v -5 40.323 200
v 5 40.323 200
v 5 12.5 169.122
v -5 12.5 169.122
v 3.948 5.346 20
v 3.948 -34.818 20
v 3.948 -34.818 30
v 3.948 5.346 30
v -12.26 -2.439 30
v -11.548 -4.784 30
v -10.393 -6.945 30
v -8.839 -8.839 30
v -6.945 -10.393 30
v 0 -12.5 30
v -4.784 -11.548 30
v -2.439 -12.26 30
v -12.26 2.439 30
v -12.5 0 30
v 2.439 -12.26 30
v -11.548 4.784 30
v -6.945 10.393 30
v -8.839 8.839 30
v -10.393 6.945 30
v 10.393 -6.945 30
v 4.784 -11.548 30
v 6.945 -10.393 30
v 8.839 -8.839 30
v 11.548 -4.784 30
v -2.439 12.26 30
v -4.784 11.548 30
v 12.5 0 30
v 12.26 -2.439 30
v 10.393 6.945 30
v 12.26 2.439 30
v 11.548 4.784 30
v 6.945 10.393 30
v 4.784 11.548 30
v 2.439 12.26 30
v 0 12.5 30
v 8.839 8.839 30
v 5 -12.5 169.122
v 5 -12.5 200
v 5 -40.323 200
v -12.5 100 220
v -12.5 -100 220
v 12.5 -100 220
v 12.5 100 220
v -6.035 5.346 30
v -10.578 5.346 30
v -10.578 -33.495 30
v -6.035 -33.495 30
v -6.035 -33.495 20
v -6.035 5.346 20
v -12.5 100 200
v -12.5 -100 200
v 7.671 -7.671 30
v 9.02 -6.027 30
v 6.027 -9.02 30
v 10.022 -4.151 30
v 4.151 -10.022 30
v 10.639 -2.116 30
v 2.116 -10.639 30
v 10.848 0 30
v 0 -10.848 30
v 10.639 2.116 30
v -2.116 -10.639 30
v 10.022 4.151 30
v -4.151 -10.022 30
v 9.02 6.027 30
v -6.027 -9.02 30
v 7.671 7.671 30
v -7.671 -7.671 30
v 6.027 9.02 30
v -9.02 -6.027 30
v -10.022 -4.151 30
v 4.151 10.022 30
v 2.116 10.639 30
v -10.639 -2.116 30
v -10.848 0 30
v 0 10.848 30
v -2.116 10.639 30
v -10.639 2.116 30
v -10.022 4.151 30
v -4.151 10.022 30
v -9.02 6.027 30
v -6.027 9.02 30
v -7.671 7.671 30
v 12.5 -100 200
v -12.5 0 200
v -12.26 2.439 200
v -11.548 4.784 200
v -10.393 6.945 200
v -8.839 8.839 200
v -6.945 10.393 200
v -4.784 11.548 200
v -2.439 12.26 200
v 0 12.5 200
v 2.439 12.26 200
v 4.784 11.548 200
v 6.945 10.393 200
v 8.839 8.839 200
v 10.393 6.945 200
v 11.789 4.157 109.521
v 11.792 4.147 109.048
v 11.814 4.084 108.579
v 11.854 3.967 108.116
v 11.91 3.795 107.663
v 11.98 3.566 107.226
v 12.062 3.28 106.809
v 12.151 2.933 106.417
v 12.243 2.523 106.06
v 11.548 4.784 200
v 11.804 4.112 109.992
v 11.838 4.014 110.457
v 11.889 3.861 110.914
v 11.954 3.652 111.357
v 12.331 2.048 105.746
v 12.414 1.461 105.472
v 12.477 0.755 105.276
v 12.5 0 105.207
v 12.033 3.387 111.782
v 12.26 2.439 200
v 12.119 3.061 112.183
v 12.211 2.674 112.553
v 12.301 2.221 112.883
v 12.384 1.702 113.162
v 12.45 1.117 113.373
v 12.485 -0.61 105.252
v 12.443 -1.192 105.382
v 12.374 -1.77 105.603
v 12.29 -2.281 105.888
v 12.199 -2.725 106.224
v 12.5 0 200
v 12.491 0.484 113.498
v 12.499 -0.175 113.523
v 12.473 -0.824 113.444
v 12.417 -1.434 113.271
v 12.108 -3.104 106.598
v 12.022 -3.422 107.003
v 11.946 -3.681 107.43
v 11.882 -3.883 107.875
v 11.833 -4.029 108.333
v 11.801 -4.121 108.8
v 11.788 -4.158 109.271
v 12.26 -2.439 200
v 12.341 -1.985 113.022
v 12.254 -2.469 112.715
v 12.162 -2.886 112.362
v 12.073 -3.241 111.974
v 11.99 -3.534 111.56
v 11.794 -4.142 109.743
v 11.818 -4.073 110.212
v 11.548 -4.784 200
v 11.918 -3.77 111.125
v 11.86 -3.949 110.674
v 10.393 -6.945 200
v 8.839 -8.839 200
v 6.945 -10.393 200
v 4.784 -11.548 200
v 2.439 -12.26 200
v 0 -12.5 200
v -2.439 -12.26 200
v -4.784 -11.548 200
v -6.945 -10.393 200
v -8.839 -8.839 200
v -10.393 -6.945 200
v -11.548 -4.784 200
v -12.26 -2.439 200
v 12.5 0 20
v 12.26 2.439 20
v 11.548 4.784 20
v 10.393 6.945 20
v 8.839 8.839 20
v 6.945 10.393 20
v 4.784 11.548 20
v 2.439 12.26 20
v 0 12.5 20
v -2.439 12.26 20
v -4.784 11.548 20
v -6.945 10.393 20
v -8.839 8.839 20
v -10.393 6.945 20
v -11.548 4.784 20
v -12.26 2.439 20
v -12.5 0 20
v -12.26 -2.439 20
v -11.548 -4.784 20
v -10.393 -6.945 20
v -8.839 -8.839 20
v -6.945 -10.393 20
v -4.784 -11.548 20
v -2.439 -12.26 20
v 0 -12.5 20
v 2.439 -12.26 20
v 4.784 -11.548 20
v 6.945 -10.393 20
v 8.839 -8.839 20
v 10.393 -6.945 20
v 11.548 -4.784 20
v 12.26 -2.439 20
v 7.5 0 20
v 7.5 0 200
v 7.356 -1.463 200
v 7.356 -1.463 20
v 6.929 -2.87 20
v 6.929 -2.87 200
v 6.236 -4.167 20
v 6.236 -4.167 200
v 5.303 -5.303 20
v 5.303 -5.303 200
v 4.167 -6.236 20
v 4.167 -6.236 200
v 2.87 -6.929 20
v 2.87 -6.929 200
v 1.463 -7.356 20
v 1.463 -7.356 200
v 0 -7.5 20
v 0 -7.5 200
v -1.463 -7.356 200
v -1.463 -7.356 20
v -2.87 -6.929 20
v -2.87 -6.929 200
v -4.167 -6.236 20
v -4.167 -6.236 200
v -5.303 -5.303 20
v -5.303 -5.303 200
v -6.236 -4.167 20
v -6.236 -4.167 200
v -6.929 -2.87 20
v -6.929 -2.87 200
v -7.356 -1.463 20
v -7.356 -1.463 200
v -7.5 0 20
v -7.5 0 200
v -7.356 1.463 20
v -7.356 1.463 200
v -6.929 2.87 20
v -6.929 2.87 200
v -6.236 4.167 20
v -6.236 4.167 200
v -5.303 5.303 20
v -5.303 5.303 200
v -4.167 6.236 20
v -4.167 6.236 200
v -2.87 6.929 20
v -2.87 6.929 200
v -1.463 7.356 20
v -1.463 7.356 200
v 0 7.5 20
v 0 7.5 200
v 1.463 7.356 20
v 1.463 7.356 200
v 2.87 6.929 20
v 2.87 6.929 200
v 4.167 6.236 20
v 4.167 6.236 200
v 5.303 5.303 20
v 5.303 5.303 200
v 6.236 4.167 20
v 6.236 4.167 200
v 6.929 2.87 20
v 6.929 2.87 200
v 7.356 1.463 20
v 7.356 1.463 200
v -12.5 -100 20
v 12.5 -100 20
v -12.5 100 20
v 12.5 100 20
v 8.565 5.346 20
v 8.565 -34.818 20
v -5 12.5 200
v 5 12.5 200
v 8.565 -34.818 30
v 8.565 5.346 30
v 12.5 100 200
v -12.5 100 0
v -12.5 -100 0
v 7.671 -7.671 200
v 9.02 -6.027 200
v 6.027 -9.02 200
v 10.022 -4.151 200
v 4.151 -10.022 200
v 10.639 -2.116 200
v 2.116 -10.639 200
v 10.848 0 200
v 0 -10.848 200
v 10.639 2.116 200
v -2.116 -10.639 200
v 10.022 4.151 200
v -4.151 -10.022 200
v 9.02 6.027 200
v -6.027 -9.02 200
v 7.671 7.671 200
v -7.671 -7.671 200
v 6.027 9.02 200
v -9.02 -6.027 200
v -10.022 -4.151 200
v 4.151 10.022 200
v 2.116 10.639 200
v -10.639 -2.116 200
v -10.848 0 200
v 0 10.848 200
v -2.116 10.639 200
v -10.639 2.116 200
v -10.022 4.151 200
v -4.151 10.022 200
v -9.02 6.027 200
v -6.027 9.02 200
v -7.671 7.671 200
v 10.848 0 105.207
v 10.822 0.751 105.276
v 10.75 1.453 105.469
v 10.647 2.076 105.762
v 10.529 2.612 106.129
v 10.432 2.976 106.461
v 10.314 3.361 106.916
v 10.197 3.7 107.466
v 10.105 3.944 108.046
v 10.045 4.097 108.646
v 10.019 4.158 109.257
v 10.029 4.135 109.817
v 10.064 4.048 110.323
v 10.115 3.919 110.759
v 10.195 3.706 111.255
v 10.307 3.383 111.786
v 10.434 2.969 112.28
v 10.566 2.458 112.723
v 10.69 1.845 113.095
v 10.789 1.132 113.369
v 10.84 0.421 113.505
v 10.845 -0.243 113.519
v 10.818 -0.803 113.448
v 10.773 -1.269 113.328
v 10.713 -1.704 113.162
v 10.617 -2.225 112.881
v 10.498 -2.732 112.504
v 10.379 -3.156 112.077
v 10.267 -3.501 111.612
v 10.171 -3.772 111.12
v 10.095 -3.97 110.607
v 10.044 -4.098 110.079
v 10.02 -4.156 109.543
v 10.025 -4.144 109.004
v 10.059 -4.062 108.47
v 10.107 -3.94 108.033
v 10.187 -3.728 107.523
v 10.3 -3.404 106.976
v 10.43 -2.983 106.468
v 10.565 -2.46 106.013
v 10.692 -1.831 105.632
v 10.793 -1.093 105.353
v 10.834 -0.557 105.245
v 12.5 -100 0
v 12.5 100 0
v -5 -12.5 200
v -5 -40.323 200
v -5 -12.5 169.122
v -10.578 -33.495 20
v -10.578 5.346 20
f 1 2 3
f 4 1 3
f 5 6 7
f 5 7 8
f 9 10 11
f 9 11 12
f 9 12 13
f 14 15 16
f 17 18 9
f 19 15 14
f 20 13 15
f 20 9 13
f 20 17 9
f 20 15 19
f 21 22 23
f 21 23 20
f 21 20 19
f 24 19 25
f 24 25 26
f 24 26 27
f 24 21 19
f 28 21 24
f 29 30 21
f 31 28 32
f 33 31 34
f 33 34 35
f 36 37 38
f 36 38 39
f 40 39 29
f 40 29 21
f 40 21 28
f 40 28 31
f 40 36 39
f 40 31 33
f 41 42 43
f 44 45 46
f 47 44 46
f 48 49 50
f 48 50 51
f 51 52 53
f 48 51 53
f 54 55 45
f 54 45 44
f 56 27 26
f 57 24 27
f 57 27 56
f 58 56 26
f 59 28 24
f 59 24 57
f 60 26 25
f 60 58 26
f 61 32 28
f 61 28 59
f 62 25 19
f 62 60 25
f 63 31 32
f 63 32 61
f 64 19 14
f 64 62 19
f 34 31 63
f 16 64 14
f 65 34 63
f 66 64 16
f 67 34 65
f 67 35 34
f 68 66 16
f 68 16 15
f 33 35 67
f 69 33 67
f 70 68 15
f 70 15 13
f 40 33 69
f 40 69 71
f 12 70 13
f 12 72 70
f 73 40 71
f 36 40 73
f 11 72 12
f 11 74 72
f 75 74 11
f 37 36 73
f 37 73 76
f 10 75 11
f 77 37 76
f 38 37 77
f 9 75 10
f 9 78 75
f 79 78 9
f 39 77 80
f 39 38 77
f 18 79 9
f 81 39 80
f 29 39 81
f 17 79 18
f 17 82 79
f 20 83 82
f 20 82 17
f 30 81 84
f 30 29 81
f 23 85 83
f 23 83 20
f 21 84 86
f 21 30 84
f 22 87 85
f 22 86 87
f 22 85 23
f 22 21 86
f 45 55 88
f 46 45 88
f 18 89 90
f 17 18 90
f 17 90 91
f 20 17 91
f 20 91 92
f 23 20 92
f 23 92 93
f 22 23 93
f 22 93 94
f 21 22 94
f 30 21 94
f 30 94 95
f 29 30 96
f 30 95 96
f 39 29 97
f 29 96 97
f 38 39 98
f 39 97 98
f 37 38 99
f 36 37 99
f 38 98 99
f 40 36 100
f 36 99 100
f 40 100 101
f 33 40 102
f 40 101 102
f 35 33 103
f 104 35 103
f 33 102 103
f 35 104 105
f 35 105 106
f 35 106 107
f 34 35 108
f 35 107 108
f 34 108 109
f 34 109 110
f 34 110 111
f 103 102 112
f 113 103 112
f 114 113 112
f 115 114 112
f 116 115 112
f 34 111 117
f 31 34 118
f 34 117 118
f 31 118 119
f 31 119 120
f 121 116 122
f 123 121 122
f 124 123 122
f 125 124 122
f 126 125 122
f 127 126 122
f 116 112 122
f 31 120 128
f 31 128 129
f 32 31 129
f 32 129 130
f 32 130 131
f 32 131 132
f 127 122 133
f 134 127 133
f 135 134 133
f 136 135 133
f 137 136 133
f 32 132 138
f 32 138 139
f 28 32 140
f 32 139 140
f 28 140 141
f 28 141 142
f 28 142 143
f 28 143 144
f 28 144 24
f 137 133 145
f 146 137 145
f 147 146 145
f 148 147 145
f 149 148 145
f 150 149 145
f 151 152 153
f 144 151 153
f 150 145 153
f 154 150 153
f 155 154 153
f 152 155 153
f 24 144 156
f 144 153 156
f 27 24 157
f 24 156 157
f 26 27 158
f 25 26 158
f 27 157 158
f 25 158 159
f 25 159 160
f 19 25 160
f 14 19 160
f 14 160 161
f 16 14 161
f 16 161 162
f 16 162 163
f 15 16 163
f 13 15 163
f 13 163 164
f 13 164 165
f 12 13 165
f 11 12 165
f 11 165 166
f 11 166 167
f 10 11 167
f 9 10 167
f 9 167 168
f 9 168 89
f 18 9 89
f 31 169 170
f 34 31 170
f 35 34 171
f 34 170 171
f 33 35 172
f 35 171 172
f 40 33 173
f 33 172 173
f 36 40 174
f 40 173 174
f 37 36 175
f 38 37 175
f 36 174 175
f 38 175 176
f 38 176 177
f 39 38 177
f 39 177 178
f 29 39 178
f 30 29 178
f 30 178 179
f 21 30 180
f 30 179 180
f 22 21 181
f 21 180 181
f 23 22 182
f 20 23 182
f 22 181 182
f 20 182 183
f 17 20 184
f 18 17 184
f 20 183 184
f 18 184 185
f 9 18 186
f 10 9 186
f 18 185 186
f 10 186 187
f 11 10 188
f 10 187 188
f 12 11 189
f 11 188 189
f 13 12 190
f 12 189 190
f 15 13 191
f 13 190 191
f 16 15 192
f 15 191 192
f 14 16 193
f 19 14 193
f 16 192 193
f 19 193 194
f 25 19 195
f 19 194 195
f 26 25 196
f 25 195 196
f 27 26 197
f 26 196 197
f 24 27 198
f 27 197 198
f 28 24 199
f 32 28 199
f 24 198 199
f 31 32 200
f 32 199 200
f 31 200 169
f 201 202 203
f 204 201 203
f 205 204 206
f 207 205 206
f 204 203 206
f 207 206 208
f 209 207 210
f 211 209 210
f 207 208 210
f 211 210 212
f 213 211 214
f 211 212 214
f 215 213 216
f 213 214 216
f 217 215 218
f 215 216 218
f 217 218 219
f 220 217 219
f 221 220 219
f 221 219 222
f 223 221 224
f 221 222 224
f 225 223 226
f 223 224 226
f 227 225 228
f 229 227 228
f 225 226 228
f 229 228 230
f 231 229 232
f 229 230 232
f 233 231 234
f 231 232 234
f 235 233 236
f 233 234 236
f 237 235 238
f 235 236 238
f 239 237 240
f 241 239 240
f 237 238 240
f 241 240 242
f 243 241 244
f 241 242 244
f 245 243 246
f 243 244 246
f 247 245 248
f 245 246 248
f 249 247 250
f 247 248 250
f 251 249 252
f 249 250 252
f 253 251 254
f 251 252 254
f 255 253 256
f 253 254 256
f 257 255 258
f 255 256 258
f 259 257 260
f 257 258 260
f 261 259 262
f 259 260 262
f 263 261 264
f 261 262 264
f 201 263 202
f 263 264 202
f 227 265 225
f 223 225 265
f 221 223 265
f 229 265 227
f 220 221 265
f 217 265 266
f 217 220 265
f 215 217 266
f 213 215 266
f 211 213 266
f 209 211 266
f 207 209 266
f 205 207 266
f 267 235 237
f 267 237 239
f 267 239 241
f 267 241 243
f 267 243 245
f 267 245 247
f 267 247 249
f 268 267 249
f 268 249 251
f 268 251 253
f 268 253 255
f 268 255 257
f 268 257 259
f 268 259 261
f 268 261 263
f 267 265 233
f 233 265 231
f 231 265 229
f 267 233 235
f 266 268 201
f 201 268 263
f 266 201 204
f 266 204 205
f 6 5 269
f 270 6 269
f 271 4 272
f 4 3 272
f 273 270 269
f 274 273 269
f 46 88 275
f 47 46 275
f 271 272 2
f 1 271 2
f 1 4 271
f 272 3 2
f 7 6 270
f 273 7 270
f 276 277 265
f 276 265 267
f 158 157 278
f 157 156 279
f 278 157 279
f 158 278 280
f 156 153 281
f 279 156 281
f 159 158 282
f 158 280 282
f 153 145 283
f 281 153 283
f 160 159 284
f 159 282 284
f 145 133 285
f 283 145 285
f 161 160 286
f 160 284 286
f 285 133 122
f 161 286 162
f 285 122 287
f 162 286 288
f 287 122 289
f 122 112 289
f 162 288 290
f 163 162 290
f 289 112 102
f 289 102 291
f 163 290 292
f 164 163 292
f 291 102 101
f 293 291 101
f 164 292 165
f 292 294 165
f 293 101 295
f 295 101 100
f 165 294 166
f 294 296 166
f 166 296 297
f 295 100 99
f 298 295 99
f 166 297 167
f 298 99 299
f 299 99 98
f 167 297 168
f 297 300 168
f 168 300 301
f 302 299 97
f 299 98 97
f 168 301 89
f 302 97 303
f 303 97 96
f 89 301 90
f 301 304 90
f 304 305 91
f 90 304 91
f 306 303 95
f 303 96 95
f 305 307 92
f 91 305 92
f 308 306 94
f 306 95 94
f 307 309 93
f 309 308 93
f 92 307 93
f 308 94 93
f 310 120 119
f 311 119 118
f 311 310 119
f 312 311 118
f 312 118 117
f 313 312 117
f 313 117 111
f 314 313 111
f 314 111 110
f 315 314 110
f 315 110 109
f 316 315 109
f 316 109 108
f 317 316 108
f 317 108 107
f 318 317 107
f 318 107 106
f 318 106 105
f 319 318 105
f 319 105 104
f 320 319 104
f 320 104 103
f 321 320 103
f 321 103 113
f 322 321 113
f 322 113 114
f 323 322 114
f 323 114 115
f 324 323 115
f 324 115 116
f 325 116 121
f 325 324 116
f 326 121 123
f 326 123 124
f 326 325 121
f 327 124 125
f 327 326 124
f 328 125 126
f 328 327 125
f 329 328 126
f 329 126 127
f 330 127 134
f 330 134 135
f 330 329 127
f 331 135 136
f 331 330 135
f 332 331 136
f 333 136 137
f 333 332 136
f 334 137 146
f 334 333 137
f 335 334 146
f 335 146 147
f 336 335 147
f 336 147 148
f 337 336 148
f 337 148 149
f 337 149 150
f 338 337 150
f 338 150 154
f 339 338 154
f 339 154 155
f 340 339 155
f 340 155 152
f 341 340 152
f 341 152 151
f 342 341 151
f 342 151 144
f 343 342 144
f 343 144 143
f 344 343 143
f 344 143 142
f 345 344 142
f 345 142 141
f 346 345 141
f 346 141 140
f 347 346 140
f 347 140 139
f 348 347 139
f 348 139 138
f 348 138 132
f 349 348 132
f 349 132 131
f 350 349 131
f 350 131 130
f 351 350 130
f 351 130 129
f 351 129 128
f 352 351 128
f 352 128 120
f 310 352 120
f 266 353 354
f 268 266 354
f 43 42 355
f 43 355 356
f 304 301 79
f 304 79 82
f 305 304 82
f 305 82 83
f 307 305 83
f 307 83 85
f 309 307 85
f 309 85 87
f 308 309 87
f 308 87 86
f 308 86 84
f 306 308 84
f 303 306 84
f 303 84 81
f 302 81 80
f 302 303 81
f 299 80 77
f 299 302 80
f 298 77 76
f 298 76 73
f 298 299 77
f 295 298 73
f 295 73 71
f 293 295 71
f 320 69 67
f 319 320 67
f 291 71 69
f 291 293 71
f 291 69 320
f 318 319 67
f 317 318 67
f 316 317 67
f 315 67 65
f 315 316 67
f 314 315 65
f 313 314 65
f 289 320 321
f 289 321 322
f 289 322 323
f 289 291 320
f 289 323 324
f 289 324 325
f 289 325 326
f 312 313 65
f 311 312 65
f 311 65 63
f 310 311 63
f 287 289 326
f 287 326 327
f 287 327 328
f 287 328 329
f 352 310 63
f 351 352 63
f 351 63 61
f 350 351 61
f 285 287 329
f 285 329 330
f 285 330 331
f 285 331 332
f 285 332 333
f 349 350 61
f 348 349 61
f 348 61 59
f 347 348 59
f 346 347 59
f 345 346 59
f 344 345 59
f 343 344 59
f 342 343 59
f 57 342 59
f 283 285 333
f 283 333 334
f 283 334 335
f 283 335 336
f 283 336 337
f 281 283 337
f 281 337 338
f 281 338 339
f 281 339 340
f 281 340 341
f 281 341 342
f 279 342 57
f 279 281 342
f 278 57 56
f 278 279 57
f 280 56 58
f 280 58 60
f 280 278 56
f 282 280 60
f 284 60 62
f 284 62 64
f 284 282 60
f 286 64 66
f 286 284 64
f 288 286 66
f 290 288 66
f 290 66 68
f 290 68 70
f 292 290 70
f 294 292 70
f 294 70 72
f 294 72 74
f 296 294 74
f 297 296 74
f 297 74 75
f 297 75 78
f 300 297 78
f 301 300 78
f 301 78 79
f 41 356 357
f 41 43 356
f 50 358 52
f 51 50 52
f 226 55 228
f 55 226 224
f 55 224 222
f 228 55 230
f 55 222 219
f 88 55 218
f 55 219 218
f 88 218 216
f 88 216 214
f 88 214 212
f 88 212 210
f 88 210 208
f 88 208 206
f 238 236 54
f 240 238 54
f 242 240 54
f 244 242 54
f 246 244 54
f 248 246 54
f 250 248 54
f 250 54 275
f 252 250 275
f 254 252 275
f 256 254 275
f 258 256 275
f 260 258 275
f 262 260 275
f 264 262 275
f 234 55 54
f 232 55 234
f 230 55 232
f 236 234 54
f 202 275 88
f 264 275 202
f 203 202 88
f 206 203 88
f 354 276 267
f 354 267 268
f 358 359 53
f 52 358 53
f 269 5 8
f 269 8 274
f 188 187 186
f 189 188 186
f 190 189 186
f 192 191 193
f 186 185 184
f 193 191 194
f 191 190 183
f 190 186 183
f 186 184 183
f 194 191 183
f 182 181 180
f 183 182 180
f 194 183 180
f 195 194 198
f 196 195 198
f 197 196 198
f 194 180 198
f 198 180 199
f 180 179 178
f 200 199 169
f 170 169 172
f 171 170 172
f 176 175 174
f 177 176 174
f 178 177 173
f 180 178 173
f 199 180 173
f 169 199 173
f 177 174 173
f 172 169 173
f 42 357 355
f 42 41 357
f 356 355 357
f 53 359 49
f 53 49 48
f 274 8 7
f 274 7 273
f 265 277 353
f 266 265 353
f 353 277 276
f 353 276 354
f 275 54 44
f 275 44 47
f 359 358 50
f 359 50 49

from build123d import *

# Parameters (mm, degrees)
SKETCH1_W              = 25
SKETCH1_H              = 200
BOSS_EXTRUDE1_DEPTH    = 20
BOSS_EXTRUDE2_START    = 200
SKETCH1_2_W            = 25
SKETCH1_2_H            = 200
BOSS_EXTRUDE2_DEPTH    = 20
SKETCH3_R              = 7.5
BOSS_EXTRUDE4_DEPTH    = 180
SKETCH4_R              = 12.5
SKETCH4_R_2            = 10.847914671
BOSS_EXTRUDE6_DEPTH    = 170
CUT_EXTRUDE1_START     = 8
SKETCH5_R              = 4.15951276
CUT_EXTRUDE1_DEPTH     = 206
SKETCH9_R              = 12.5
BOSS_EXTRUDE7_DEPTH    = 10
SKETCH10_W             = 4.542152159
SKETCH10_H             = 38.840988947
BOSS_EXTRUDE8_DEPTH    = 10
SKETCH10_W_2           = 4.617563116
SKETCH10_H_2           = 40.163970658
BOSS_EXTRUDE8_2_DEPTH  = 10
BOSS_EXTRUDE10_DEPTH   = 5
BOSS_EXTRUDE10_2_DEPTH = 5


with BuildPart() as part:
    # Sketch1 → Boss-Extrude1 (new body)
    with BuildSketch(Plane.XY):
        Rectangle(SKETCH1_W, SKETCH1_H)
    extrude(amount=BOSS_EXTRUDE1_DEPTH)



with BuildPart() as body_2:
    # Sketch1<2> → Boss-Extrude2 (new body)
    with BuildSketch(Plane.XY.offset(BOSS_EXTRUDE2_START)):
        Rectangle(SKETCH1_2_W, SKETCH1_2_H)
    extrude(amount=BOSS_EXTRUDE2_DEPTH)


with BuildPart() as part_1:
    add(part.part)

    add(body_2.part)  # Boss-Extrude4 merges body 2
    # Sketch3 → Boss-Extrude4 (add)
    with BuildSketch(Plane(origin=(0, 0, 200), x_dir=(-1, 0, 0), z_dir=(0, 0, -1))):
        with Locations(Location((0, 0, 0), (0, 0, 180))):
            Circle(SKETCH3_R)
    extrude(amount=BOSS_EXTRUDE4_DEPTH)


with BuildPart() as body_2_2:
    # Sketch4 → Boss-Extrude6 (new body)
    with BuildSketch(Plane(origin=(0, 0, 200), x_dir=(-1, 0, 0), z_dir=(0, 0, -1))):
        Circle(SKETCH4_R)
        Circle(SKETCH4_R_2, mode=Mode.SUBTRACT)
    extrude(amount=BOSS_EXTRUDE6_DEPTH)

    # Sketch5 → Cut-Extrude1 (cut)
    with BuildSketch(Plane(origin=(0, 0, 0), x_dir=(0, 0, -1), z_dir=(1, 0, 0)).offset(CUT_EXTRUDE1_START)):
        with Locations((-109.366831525, 0)):
            Circle(SKETCH5_R)
    extrude(amount=CUT_EXTRUDE1_DEPTH, mode=Mode.SUBTRACT)


with BuildPart() as body_3:
    # Sketch9 → Boss-Extrude7 (new body)
    with BuildSketch(Plane.XY.offset(20)):
        Circle(SKETCH9_R)
    extrude(amount=BOSS_EXTRUDE7_DEPTH)


with BuildPart() as body_4:
    # Sketch10 → Boss-Extrude8 (new body)
    with BuildSketch(Plane.XY.offset(20)):
        with Locations((-8.306447613, -14.074886259)):
            Rectangle(SKETCH10_W, SKETCH10_H)
    extrude(amount=BOSS_EXTRUDE8_DEPTH)


with BuildPart() as body_5:
    # Sketch10 → Boss-Extrude8 2 (new body)
    with BuildSketch(Plane.XY.offset(20)):
        with Locations((6.256640597, -14.736377114)):
            Rectangle(SKETCH10_W_2, SKETCH10_H_2)
    extrude(amount=BOSS_EXTRUDE8_2_DEPTH)


with BuildPart() as body_6:
    # Sketch13 → Boss-Extrude10 (new, symmetric)
    with BuildSketch(Plane(origin=(0, 0, 0), x_dir=(0, 0, -1), z_dir=(1, 0, 0))):
        Polygon((-200, 40.323059988), (-169.121721381, 12.5), (-200, 12.5), align=None)
    extrude(amount=BOSS_EXTRUDE10_DEPTH, both=True)


with BuildPart() as body_7:
    # Sketch13 → Boss-Extrude10 2 (new, symmetric)
    with BuildSketch(Plane(origin=(0, 0, 0), x_dir=(0, 0, -1), z_dir=(1, 0, 0))):
        Polygon((-169.121721381, -12.5), (-200, -12.5), (-200, -40.323059988), align=None)
    extrude(amount=BOSS_EXTRUDE10_2_DEPTH, both=True)


solid = Compound([part_1.part, body_2_2.part, body_3.part, body_4.part, body_5.part, body_6.part, body_7.part])
